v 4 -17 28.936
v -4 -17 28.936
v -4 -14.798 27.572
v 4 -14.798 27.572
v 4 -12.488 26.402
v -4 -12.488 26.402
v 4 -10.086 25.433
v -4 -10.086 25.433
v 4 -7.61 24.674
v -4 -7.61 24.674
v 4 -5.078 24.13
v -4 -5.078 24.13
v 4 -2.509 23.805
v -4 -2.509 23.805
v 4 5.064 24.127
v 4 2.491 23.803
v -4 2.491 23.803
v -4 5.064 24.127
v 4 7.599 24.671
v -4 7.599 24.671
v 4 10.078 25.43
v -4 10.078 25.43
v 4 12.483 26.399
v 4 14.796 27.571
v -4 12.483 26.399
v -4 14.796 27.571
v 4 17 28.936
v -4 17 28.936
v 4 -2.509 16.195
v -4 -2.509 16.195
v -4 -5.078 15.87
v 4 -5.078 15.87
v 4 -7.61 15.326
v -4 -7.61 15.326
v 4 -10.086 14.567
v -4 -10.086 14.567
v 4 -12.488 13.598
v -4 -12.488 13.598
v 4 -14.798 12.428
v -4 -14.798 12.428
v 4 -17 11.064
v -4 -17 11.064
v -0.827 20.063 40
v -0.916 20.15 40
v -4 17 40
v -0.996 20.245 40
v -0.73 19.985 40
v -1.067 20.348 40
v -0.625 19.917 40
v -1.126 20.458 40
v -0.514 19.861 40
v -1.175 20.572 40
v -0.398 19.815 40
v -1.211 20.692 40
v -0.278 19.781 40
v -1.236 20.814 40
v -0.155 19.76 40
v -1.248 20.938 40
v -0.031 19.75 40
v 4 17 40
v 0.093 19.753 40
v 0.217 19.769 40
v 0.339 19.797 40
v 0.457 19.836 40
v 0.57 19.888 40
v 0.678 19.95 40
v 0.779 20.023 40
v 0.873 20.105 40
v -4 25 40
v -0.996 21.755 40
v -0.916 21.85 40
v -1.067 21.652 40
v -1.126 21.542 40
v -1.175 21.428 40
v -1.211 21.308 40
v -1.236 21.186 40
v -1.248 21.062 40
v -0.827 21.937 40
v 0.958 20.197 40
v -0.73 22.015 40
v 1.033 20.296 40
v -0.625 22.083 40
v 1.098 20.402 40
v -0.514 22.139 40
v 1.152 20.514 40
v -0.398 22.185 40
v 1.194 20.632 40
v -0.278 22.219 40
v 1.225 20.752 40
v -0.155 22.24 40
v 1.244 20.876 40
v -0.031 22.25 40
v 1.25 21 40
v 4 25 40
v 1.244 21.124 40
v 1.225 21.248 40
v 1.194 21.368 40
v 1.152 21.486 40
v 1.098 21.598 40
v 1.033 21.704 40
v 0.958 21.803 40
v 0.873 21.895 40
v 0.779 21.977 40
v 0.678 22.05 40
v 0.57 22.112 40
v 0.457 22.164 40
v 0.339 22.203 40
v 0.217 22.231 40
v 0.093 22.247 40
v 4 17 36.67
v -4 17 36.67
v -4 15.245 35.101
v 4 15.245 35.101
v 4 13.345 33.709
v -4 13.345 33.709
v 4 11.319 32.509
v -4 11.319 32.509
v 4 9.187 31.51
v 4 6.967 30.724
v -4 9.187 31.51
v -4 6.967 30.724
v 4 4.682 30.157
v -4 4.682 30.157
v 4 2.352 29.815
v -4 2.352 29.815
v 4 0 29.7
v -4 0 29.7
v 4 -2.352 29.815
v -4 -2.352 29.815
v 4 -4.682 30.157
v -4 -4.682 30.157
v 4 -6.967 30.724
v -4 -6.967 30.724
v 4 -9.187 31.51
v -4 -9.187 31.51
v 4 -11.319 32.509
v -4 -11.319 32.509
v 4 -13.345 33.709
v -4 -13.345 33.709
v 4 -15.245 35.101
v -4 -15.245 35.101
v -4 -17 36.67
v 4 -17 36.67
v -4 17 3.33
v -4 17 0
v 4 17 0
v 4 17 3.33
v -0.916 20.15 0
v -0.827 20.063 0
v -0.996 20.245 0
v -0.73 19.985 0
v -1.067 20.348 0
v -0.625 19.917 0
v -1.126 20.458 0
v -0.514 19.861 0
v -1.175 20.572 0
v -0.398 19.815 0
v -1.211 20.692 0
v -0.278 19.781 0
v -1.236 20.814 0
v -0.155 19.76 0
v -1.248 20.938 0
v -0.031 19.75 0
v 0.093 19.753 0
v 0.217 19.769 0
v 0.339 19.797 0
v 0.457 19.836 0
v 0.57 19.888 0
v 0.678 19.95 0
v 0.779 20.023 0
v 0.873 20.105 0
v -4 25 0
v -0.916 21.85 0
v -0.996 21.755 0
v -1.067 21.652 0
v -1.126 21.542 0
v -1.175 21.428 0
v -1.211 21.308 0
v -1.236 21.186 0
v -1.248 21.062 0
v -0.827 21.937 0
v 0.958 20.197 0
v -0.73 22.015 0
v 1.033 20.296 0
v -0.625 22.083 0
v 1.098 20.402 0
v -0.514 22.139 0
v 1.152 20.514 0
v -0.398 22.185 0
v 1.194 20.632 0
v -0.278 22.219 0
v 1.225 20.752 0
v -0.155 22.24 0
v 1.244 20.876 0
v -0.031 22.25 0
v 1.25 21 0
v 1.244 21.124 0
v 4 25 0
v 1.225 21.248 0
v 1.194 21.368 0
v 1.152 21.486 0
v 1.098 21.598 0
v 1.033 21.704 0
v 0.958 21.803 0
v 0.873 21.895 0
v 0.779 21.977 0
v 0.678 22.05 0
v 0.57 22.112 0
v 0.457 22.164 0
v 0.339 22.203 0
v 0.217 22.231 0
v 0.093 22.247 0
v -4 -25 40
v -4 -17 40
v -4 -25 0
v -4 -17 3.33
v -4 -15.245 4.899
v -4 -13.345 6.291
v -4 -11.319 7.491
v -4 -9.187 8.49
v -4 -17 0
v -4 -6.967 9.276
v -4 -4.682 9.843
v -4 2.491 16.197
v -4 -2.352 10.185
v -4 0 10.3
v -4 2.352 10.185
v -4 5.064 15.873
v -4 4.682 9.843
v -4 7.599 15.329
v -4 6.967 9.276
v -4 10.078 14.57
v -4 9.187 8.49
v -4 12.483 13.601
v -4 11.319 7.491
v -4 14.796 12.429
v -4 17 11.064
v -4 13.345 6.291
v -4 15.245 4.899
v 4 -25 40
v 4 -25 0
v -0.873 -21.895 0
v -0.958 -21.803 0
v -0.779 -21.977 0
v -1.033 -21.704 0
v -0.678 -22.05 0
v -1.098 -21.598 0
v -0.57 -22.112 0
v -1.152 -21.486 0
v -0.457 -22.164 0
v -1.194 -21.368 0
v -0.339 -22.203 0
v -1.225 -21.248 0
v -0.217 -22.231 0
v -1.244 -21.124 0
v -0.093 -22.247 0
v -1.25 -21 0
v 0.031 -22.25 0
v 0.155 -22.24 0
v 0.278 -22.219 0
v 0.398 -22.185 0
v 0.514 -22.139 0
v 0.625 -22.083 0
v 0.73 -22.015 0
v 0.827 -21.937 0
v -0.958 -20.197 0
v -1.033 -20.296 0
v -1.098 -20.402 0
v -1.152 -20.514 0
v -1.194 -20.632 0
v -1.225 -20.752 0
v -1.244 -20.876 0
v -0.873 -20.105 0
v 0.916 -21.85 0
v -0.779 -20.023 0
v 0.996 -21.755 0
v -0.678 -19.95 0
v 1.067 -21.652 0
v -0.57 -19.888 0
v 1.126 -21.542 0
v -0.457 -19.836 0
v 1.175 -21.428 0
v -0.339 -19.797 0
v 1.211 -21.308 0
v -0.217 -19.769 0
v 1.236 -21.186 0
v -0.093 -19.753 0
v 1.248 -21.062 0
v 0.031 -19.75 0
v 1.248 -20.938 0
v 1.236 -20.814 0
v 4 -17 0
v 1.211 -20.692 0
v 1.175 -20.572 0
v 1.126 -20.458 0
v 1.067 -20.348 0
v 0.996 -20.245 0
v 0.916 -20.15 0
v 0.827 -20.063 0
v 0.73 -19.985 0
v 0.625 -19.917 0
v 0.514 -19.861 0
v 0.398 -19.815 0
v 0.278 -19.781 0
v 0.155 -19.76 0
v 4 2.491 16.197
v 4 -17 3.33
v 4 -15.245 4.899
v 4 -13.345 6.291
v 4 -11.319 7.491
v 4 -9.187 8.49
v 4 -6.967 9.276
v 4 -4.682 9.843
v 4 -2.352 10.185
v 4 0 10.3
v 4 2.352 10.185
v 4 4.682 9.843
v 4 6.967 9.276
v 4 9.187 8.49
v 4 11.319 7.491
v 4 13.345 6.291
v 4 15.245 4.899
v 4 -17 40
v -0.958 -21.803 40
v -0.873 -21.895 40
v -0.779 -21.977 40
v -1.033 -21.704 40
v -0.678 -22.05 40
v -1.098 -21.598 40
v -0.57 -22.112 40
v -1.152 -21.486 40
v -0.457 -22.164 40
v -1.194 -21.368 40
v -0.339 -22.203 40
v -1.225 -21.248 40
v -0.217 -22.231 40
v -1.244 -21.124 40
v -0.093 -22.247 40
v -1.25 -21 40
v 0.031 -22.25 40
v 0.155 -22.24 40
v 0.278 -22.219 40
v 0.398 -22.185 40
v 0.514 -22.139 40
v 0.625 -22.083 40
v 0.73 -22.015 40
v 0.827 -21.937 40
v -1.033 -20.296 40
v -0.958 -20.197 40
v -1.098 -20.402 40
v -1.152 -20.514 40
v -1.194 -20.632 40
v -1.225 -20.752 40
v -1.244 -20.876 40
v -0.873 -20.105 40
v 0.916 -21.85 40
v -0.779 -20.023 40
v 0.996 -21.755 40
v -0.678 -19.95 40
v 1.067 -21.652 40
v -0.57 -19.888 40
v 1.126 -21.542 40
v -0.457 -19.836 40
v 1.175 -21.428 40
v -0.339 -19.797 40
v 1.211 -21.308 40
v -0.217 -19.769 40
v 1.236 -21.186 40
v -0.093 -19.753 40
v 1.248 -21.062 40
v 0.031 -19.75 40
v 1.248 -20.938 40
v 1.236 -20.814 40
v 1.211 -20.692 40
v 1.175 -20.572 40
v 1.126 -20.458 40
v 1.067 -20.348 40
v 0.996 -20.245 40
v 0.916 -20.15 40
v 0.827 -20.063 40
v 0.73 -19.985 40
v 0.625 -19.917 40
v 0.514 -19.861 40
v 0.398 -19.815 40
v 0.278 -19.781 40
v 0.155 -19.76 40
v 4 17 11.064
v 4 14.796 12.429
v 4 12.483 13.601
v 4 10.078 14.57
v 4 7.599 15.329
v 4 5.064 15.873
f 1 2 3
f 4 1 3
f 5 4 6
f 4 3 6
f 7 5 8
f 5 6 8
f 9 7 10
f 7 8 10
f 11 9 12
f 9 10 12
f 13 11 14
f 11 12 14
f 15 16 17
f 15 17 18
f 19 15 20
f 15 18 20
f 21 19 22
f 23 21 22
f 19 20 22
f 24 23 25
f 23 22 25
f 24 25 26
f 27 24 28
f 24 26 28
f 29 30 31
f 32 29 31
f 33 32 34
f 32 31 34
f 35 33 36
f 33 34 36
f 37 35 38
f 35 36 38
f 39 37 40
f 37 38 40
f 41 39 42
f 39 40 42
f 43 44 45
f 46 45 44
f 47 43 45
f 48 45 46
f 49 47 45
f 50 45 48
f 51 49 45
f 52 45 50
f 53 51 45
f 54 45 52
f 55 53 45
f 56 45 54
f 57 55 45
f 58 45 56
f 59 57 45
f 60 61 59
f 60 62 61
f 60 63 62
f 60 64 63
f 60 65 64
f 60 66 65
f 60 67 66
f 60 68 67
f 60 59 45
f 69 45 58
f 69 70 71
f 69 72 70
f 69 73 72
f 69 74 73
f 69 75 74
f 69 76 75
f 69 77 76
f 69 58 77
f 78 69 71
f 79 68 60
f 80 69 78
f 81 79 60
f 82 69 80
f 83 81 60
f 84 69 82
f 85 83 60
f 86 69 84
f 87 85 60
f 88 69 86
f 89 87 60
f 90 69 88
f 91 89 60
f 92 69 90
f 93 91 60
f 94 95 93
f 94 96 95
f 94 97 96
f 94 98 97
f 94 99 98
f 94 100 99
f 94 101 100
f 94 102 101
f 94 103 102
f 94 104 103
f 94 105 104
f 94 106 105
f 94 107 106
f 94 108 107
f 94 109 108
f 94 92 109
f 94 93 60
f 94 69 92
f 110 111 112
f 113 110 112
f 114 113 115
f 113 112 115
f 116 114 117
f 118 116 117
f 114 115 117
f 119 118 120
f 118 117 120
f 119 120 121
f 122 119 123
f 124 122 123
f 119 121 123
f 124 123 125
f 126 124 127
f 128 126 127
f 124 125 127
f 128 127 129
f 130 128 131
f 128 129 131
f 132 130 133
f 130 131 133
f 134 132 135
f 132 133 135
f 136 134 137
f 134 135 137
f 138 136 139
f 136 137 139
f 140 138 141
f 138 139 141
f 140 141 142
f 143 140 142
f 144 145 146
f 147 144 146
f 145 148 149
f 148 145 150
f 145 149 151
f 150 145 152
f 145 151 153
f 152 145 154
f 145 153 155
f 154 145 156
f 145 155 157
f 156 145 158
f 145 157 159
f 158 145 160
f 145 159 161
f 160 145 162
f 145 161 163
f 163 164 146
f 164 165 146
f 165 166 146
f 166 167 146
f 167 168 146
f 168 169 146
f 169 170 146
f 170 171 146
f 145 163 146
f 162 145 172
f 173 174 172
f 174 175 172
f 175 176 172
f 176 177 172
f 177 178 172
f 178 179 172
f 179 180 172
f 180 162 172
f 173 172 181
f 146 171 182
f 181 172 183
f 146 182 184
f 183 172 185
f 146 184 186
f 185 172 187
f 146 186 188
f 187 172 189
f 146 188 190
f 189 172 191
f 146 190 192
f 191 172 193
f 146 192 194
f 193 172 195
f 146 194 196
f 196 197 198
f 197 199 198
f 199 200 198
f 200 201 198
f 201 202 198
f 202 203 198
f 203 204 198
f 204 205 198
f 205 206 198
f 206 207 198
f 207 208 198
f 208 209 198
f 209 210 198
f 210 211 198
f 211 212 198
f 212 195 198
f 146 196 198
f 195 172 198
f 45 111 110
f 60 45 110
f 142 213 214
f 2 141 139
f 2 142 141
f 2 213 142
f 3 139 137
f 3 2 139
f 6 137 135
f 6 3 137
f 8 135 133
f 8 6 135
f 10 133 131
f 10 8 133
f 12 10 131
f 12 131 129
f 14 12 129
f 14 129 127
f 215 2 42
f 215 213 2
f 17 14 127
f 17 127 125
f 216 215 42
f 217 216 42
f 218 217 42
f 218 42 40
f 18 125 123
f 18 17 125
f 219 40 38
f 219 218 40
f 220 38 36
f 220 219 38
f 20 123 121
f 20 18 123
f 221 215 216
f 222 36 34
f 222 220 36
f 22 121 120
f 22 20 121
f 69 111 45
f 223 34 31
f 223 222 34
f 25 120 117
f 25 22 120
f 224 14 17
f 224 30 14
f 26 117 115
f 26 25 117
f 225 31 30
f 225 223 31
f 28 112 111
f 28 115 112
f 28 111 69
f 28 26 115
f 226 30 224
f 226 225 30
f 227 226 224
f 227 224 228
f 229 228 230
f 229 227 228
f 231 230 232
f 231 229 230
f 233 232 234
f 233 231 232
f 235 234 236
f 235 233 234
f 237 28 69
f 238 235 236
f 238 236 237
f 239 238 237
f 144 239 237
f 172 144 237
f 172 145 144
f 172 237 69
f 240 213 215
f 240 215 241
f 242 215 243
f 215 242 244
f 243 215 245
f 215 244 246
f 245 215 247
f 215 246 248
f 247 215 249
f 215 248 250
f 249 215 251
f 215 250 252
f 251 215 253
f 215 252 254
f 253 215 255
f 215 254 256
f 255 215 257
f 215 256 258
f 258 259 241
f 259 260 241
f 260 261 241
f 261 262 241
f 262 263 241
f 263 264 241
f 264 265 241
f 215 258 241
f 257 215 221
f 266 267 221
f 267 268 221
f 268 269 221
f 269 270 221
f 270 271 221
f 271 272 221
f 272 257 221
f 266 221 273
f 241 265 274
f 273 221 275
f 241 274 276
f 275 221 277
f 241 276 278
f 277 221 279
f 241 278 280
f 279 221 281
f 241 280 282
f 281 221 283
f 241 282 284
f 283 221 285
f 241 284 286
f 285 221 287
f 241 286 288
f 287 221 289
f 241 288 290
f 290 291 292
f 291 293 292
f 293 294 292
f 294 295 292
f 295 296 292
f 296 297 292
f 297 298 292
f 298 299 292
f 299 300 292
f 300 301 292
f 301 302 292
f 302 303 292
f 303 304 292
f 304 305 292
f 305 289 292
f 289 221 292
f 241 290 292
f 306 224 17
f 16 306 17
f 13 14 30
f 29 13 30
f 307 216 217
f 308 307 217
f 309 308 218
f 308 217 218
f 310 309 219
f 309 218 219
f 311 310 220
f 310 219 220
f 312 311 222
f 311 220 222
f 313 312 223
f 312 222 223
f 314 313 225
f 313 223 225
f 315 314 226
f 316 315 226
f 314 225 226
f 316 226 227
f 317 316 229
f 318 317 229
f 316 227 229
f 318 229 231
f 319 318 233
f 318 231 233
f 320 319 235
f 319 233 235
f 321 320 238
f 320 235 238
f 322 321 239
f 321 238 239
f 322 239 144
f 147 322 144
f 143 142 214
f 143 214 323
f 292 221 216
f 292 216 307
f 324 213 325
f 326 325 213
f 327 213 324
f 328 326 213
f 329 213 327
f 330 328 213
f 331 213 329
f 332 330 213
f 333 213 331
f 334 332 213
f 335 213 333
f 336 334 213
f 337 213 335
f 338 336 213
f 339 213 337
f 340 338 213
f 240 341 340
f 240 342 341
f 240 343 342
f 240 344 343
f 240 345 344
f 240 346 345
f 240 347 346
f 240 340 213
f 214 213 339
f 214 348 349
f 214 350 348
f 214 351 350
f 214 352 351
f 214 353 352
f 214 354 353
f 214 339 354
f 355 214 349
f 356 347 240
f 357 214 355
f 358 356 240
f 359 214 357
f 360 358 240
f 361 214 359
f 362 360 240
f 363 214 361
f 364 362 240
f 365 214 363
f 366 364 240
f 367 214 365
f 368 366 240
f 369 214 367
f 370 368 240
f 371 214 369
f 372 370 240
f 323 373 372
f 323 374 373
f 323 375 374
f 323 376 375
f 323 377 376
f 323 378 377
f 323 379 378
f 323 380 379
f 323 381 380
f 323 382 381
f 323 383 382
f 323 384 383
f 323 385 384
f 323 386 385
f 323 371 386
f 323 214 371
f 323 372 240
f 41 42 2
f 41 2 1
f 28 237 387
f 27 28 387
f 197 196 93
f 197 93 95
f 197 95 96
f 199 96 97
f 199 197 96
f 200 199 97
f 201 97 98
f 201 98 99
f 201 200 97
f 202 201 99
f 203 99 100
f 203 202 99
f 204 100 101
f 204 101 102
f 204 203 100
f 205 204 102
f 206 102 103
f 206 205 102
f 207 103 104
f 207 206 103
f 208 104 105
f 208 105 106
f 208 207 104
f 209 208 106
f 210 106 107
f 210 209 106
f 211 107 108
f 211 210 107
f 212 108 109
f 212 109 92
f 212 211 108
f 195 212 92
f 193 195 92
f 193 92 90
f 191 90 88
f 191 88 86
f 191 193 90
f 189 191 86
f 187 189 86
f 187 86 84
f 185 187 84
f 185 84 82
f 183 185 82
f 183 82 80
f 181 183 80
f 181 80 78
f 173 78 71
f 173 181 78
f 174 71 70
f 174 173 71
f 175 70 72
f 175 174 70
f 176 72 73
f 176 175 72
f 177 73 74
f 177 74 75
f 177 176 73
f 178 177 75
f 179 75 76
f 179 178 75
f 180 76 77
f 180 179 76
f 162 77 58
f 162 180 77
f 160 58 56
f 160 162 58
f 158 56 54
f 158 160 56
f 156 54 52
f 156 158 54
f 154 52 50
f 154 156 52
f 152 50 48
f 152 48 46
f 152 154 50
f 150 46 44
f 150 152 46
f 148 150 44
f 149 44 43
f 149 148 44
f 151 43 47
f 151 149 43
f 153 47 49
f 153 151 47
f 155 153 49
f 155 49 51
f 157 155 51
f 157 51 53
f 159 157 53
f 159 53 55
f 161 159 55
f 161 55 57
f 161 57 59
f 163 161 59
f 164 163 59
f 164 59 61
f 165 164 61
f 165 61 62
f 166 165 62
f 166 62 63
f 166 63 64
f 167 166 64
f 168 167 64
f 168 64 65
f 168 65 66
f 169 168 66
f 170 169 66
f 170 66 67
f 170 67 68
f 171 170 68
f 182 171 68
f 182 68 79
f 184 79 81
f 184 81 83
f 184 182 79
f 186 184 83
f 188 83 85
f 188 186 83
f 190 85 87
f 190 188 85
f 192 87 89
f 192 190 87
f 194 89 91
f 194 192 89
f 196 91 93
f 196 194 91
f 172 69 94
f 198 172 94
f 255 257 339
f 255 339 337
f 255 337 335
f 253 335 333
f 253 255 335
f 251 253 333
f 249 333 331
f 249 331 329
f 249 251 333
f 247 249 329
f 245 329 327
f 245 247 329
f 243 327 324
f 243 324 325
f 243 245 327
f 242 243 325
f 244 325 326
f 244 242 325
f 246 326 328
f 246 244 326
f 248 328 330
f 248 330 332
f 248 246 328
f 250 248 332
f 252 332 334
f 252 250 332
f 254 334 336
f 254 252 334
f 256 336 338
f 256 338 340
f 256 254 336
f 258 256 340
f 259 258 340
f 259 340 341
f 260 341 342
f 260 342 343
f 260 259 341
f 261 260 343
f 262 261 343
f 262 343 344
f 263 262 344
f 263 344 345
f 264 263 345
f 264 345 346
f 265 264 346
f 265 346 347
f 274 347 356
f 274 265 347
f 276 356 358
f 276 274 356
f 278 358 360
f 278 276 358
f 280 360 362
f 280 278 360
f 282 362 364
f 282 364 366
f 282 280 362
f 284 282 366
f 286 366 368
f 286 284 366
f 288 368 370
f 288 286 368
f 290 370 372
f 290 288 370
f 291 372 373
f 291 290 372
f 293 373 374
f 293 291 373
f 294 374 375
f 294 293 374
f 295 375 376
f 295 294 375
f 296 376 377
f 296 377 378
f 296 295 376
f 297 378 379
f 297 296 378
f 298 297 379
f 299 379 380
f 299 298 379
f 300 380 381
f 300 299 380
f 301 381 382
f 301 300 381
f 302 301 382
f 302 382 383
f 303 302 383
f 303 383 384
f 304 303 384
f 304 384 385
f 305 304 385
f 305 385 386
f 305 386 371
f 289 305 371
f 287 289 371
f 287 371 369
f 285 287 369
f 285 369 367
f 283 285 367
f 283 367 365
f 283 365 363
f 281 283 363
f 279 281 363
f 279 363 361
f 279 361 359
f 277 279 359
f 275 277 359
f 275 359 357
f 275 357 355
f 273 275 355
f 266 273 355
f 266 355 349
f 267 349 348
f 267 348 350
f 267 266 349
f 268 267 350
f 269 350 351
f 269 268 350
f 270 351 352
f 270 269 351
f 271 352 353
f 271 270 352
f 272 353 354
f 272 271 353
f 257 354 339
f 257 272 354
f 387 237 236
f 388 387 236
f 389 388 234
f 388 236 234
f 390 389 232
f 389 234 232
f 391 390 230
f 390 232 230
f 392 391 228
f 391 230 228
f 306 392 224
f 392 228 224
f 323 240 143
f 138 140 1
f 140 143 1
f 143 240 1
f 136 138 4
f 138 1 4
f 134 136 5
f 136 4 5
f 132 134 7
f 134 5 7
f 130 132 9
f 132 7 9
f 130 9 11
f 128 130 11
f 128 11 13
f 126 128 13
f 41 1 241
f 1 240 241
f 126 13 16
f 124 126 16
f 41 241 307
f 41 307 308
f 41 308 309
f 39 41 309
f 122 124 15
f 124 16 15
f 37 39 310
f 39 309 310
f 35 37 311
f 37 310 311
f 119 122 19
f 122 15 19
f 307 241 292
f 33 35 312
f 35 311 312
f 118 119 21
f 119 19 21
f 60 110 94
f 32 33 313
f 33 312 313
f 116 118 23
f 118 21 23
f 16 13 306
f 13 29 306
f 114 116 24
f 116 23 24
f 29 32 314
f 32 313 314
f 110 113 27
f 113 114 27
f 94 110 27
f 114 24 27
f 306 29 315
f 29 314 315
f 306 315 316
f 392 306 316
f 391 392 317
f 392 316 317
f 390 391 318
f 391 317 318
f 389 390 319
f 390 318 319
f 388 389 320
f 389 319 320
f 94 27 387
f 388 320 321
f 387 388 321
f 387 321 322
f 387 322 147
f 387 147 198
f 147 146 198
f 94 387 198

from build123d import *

# Parameters (mm, degrees)
SKETCH1_W             = 8
SKETCH1_H             = 8
SKETCH1_R             = 1.25
BOSS_EXTRUDE1_DEPTH   = 40
BOSS_EXTRUDE1_2_DEPTH = 40
BOSS_EXTRUDE2_DEPTH   = 8


with BuildPart() as part:
    # Sketch1 → Boss-Extrude1 (new body)
    with BuildSketch(Plane.XY):
        with Locations((0, 21)):
            Rectangle(SKETCH1_W, SKETCH1_H)
        with Locations((0, 21)):
            Circle(SKETCH1_R, mode=Mode.SUBTRACT)
    extrude(amount=BOSS_EXTRUDE1_DEPTH)



with BuildPart() as body_2:
    # Sketch1 → Boss-Extrude1 2 (new body)
    with BuildSketch(Plane.XY):
        with Locations((0, -21)):
            Rectangle(SKETCH1_W, SKETCH1_H)
        with Locations(Location((0, -21, 0), (0, 0, 180))):
            Circle(SKETCH1_R, mode=Mode.SUBTRACT)
    extrude(amount=BOSS_EXTRUDE1_2_DEPTH)


with BuildPart() as part_1:
    add(part.part)

    add(body_2.part)  # Boss-Extrude2 merges body 2
    # Sketch2 → Boss-Extrude2 (add)
    with BuildSketch(Plane.ZY.offset(4)):
        with BuildLine():
            Line((3.329640508, 17), (11.063985021, 17))
            ThreePointArc((11.063985021, 17), (14.56966913, 10.077818269), (16.196928044, 2.491089763))
            Line((16.196928044, 2.491089763), (23.803071956, 2.491089763))
            ThreePointArc((23.803071956, 2.491089763), (25.43033087, 10.077818269), (28.936014979, 17))
            Line((28.936014979, 17), (36.670359492, 17))
            ThreePointArc((36.670359492, 17), (29.700211914, 0), (36.670359492, -17))
            Line((36.670359492, -17), (28.936014979, -17))
            ThreePointArc((28.936014979, -17), (25.433314102, -10.086246784), (23.804551435, -2.508910237))
            Line((23.804551435, -2.508910237), (16.195448565, -2.508910237))
            ThreePointArc((16.195448565, -2.508910237), (14.566685898, -10.086246784), (11.063985021, -17))
            Line((11.063985021, -17), (3.329640508, -17))
            ThreePointArc((3.329640508, -17), (10.299788086, 0), (3.329640508, 17))
        make_face()
    extrude(amount=-BOSS_EXTRUDE2_DEPTH)


solid = part_1.part
